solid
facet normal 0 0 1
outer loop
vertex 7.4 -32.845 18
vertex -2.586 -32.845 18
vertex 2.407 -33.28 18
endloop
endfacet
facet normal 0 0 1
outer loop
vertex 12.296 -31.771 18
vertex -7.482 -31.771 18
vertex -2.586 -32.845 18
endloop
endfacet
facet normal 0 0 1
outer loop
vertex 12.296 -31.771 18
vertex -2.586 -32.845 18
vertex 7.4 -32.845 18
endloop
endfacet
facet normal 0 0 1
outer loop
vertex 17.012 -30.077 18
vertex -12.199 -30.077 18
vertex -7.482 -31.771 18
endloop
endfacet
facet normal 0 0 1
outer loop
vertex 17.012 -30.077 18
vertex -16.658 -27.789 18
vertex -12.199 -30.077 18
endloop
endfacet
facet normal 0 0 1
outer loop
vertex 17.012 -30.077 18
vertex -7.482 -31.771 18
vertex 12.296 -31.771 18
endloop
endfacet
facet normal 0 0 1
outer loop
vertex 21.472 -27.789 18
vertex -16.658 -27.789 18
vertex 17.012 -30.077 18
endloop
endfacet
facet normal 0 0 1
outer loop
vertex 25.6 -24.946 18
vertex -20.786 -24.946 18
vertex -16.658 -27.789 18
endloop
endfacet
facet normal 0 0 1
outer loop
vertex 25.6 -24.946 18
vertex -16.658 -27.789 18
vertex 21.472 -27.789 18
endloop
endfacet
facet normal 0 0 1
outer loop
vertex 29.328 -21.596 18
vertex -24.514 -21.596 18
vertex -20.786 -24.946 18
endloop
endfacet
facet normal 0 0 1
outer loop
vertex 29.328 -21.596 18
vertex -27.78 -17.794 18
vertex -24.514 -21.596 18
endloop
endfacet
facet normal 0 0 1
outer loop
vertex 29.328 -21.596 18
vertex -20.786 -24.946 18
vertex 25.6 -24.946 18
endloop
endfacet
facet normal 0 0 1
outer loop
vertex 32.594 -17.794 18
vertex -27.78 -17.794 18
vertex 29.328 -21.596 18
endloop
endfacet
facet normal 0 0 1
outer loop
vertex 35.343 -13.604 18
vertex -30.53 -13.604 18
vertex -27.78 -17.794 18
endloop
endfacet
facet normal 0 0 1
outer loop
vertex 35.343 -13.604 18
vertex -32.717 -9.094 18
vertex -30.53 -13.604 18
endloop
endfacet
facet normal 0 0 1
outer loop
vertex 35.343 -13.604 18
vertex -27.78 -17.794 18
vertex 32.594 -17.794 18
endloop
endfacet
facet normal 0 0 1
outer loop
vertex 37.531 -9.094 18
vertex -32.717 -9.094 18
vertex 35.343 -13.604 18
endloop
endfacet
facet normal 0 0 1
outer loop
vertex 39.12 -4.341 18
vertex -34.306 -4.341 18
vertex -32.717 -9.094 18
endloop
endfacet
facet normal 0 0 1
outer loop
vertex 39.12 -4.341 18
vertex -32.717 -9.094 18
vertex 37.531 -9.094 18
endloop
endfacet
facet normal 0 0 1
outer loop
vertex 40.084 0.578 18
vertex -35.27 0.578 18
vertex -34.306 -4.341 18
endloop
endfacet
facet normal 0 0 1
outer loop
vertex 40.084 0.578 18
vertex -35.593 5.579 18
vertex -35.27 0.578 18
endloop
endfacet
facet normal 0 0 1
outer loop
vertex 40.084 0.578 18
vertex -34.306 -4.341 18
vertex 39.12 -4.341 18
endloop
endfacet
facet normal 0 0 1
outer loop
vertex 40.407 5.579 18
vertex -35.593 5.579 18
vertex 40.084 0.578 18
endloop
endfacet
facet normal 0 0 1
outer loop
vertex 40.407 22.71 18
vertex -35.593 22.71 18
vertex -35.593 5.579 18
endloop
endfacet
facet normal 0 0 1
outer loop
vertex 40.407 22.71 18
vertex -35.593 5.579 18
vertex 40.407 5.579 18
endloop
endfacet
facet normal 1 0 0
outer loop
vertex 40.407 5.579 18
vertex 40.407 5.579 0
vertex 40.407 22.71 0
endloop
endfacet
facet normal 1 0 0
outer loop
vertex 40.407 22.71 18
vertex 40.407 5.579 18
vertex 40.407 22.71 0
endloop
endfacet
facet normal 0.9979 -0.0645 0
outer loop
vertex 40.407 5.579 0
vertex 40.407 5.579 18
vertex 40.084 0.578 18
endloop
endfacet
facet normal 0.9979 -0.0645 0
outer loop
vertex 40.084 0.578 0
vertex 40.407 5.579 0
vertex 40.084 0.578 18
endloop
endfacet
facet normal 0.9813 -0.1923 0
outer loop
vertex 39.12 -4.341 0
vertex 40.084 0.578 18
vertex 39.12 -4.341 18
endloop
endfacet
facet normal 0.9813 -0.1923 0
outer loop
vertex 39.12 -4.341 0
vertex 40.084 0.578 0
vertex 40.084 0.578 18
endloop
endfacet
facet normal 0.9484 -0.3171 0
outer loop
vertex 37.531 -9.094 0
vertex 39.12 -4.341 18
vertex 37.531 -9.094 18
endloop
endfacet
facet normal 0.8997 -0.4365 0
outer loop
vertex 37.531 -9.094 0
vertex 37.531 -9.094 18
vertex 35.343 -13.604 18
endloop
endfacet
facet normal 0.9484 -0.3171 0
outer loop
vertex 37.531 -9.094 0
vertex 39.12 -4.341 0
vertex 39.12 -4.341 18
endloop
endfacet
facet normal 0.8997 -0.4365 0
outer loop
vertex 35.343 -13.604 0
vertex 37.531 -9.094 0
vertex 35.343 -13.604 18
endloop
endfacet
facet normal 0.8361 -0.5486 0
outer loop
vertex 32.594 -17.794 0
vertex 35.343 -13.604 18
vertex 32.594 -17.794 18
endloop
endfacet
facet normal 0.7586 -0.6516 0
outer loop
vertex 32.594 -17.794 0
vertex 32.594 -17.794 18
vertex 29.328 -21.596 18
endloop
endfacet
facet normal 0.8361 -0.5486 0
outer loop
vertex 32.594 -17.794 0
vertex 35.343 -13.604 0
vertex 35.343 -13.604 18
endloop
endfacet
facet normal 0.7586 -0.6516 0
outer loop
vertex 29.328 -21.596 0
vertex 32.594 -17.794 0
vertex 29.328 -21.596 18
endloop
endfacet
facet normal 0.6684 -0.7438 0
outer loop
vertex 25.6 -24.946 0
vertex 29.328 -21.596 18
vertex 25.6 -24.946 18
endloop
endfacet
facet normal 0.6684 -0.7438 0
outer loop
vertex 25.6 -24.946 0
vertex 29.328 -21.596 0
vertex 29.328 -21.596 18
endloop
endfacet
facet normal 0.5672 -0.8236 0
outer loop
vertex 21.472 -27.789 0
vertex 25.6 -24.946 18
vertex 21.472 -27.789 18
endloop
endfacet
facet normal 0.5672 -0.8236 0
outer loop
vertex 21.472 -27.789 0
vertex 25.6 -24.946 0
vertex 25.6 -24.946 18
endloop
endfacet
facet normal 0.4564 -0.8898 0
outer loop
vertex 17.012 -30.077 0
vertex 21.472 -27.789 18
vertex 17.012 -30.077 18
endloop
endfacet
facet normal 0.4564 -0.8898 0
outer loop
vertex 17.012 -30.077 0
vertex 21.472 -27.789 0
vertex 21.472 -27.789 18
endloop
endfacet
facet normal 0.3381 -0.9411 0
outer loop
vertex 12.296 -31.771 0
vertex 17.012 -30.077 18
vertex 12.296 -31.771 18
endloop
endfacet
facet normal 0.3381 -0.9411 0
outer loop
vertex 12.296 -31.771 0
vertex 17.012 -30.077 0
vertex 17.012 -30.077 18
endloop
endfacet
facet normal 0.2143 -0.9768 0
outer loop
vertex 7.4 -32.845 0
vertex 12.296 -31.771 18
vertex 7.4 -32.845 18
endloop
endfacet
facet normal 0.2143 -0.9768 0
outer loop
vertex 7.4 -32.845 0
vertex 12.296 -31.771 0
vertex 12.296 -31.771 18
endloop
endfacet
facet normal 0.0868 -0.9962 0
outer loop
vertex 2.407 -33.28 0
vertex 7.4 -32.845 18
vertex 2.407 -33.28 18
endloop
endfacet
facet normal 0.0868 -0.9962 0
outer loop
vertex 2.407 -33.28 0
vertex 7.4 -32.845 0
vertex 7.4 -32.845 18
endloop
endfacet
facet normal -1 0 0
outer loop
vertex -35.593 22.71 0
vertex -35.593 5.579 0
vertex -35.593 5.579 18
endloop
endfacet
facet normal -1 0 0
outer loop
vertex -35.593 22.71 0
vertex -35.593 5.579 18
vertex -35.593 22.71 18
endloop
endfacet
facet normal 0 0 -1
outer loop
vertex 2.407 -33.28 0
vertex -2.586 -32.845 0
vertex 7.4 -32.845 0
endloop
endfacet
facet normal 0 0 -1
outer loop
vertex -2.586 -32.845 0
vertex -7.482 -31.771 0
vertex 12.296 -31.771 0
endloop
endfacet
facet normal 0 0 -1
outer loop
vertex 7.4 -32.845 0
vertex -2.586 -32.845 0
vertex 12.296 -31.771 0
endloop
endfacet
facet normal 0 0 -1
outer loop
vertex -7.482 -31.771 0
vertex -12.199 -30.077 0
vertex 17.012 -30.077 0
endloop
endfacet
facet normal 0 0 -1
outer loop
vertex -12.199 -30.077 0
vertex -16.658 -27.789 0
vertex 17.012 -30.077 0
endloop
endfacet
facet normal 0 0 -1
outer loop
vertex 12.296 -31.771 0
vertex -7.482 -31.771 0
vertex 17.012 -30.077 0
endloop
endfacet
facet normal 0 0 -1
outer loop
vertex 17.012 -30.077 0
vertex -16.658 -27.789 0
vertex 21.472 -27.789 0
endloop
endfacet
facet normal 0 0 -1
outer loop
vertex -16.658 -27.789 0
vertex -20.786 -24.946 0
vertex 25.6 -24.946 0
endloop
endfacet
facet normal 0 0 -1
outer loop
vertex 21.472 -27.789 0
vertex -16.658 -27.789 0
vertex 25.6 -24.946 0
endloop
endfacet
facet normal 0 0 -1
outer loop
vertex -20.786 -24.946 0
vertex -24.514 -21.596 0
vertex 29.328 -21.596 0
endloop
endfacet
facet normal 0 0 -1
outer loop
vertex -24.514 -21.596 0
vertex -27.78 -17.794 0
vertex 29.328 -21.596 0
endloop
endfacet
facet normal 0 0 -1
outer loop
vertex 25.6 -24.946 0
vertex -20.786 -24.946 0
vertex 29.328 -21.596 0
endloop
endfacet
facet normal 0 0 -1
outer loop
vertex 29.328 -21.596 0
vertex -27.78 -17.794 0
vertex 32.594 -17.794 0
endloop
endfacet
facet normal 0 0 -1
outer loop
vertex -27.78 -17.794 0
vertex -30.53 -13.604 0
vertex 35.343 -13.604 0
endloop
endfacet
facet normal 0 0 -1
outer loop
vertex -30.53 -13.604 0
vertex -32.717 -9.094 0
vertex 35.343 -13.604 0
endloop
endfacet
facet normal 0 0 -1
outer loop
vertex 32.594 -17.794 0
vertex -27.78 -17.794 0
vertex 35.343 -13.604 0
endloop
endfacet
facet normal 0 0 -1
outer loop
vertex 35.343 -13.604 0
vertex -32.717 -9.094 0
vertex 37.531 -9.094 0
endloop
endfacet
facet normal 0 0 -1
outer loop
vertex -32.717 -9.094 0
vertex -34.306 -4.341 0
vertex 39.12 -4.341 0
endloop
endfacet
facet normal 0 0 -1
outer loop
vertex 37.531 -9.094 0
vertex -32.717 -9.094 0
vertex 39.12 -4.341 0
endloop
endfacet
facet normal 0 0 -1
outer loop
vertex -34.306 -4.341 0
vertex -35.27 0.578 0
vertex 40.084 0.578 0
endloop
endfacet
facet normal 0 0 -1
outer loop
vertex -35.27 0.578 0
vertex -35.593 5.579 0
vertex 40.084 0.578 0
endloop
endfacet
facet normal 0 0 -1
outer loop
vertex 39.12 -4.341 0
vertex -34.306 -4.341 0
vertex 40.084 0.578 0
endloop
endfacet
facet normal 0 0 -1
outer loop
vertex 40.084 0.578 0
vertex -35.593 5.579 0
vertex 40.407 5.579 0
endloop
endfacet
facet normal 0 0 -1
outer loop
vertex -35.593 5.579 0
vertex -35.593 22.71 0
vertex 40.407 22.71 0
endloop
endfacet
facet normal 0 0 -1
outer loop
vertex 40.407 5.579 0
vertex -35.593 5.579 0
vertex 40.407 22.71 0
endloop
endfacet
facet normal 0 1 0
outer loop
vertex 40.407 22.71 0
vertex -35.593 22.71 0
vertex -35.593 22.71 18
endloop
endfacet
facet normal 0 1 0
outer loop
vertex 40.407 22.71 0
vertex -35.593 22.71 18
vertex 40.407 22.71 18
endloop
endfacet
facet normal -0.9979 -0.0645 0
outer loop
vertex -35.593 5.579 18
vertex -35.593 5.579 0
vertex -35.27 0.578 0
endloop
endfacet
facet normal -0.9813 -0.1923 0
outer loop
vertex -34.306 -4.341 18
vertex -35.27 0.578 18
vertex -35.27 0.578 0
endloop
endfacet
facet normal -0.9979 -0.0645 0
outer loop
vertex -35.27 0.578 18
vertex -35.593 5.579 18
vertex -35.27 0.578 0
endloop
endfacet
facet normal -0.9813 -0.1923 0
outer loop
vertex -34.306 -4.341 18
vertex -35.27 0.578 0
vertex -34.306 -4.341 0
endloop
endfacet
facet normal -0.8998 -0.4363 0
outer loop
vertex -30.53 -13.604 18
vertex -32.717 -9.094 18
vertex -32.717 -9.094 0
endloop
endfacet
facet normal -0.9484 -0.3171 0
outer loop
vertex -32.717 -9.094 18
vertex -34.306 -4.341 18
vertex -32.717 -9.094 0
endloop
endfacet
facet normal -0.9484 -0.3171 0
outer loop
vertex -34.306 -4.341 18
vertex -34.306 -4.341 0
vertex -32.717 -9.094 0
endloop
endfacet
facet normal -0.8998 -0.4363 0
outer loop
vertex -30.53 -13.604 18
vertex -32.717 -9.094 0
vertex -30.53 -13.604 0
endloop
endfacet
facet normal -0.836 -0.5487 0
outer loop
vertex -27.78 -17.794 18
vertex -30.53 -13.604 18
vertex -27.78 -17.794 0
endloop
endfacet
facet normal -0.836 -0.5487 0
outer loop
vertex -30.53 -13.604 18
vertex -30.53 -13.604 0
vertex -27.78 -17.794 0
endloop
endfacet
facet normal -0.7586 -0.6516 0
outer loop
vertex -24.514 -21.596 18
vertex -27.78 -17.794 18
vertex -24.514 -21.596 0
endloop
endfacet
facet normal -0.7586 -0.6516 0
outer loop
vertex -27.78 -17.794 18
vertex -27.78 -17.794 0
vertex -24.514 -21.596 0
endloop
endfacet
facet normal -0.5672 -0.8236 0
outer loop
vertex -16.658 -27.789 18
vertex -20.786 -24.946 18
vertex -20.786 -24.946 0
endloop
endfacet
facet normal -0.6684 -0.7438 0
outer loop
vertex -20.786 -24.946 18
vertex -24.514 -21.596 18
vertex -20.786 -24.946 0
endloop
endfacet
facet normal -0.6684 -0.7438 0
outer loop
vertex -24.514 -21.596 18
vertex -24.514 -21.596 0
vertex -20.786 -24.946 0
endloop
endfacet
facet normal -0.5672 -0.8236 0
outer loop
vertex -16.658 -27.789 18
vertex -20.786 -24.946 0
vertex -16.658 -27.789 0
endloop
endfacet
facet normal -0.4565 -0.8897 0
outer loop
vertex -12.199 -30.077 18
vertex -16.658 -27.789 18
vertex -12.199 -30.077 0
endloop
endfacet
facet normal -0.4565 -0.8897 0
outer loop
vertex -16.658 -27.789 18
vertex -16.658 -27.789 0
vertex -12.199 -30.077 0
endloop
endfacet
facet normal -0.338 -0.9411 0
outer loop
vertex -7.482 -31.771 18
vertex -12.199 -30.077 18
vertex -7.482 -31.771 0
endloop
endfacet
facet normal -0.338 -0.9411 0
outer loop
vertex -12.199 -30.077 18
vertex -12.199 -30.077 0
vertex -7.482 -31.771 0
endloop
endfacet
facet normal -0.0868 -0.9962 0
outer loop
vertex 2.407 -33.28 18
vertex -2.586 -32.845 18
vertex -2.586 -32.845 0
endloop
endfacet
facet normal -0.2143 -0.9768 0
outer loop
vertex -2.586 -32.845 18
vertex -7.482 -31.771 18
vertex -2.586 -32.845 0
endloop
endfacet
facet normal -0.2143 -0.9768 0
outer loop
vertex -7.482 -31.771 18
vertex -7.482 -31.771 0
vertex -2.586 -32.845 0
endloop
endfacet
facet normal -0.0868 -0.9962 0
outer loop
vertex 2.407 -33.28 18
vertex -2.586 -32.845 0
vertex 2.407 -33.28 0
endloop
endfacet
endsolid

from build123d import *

# Parameters (mm, degrees)
F0_W        = 76
F0_H        = 56
F1_DEPTH    = 18
F2_T1_DEPTH = 212.344191771


# Not quite as in the source:
# - a fillet or chamfer that OpenCascade refuses, or shapes differently, is made with other operations: its cross-section is extruded or revolved along the edge and cut away or added


with BuildPart() as f1:
    # F0 (on Top) → F1 (new body)
    with BuildSketch(Plane.XY):
        with Locations((2.4067710042, -5.2896709442)):
            Rectangle(F0_W, F0_H)
    extrude(amount=F1_DEPTH)

    # F2: fillet of radius 38.8688383542 on 2 edges, made by hand

    # F2_s2 → F2_t1 (cut)
    with BuildSketch(Plane.XY.offset(-97.1720958855)):
        with BuildLine():
            ThreePointArc((-35.5932289958, 5.57916741), (-24.2088098187, -21.9052517671), (3.2756093584, -33.2896709442))
            Line((3.2756093584, -33.2896709442), (-35.5932289958, -33.2896709442))
            Line((-35.5932289958, -33.2896709442), (-35.5932289958, 5.57916741))
        make_face()
        with BuildLine():
            ThreePointArc((40.4067710042, 5.57916741), (29.0223518271, -21.9052517671), (1.53793265, -33.2896709442))
            Line((1.53793265, -33.2896709442), (40.4067710042, -33.2896709442))
            Line((40.4067710042, -33.2896709442), (40.4067710042, 5.57916741))
        make_face()
    extrude(amount=F2_T1_DEPTH, mode=Mode.SUBTRACT)


solid = f1.part
